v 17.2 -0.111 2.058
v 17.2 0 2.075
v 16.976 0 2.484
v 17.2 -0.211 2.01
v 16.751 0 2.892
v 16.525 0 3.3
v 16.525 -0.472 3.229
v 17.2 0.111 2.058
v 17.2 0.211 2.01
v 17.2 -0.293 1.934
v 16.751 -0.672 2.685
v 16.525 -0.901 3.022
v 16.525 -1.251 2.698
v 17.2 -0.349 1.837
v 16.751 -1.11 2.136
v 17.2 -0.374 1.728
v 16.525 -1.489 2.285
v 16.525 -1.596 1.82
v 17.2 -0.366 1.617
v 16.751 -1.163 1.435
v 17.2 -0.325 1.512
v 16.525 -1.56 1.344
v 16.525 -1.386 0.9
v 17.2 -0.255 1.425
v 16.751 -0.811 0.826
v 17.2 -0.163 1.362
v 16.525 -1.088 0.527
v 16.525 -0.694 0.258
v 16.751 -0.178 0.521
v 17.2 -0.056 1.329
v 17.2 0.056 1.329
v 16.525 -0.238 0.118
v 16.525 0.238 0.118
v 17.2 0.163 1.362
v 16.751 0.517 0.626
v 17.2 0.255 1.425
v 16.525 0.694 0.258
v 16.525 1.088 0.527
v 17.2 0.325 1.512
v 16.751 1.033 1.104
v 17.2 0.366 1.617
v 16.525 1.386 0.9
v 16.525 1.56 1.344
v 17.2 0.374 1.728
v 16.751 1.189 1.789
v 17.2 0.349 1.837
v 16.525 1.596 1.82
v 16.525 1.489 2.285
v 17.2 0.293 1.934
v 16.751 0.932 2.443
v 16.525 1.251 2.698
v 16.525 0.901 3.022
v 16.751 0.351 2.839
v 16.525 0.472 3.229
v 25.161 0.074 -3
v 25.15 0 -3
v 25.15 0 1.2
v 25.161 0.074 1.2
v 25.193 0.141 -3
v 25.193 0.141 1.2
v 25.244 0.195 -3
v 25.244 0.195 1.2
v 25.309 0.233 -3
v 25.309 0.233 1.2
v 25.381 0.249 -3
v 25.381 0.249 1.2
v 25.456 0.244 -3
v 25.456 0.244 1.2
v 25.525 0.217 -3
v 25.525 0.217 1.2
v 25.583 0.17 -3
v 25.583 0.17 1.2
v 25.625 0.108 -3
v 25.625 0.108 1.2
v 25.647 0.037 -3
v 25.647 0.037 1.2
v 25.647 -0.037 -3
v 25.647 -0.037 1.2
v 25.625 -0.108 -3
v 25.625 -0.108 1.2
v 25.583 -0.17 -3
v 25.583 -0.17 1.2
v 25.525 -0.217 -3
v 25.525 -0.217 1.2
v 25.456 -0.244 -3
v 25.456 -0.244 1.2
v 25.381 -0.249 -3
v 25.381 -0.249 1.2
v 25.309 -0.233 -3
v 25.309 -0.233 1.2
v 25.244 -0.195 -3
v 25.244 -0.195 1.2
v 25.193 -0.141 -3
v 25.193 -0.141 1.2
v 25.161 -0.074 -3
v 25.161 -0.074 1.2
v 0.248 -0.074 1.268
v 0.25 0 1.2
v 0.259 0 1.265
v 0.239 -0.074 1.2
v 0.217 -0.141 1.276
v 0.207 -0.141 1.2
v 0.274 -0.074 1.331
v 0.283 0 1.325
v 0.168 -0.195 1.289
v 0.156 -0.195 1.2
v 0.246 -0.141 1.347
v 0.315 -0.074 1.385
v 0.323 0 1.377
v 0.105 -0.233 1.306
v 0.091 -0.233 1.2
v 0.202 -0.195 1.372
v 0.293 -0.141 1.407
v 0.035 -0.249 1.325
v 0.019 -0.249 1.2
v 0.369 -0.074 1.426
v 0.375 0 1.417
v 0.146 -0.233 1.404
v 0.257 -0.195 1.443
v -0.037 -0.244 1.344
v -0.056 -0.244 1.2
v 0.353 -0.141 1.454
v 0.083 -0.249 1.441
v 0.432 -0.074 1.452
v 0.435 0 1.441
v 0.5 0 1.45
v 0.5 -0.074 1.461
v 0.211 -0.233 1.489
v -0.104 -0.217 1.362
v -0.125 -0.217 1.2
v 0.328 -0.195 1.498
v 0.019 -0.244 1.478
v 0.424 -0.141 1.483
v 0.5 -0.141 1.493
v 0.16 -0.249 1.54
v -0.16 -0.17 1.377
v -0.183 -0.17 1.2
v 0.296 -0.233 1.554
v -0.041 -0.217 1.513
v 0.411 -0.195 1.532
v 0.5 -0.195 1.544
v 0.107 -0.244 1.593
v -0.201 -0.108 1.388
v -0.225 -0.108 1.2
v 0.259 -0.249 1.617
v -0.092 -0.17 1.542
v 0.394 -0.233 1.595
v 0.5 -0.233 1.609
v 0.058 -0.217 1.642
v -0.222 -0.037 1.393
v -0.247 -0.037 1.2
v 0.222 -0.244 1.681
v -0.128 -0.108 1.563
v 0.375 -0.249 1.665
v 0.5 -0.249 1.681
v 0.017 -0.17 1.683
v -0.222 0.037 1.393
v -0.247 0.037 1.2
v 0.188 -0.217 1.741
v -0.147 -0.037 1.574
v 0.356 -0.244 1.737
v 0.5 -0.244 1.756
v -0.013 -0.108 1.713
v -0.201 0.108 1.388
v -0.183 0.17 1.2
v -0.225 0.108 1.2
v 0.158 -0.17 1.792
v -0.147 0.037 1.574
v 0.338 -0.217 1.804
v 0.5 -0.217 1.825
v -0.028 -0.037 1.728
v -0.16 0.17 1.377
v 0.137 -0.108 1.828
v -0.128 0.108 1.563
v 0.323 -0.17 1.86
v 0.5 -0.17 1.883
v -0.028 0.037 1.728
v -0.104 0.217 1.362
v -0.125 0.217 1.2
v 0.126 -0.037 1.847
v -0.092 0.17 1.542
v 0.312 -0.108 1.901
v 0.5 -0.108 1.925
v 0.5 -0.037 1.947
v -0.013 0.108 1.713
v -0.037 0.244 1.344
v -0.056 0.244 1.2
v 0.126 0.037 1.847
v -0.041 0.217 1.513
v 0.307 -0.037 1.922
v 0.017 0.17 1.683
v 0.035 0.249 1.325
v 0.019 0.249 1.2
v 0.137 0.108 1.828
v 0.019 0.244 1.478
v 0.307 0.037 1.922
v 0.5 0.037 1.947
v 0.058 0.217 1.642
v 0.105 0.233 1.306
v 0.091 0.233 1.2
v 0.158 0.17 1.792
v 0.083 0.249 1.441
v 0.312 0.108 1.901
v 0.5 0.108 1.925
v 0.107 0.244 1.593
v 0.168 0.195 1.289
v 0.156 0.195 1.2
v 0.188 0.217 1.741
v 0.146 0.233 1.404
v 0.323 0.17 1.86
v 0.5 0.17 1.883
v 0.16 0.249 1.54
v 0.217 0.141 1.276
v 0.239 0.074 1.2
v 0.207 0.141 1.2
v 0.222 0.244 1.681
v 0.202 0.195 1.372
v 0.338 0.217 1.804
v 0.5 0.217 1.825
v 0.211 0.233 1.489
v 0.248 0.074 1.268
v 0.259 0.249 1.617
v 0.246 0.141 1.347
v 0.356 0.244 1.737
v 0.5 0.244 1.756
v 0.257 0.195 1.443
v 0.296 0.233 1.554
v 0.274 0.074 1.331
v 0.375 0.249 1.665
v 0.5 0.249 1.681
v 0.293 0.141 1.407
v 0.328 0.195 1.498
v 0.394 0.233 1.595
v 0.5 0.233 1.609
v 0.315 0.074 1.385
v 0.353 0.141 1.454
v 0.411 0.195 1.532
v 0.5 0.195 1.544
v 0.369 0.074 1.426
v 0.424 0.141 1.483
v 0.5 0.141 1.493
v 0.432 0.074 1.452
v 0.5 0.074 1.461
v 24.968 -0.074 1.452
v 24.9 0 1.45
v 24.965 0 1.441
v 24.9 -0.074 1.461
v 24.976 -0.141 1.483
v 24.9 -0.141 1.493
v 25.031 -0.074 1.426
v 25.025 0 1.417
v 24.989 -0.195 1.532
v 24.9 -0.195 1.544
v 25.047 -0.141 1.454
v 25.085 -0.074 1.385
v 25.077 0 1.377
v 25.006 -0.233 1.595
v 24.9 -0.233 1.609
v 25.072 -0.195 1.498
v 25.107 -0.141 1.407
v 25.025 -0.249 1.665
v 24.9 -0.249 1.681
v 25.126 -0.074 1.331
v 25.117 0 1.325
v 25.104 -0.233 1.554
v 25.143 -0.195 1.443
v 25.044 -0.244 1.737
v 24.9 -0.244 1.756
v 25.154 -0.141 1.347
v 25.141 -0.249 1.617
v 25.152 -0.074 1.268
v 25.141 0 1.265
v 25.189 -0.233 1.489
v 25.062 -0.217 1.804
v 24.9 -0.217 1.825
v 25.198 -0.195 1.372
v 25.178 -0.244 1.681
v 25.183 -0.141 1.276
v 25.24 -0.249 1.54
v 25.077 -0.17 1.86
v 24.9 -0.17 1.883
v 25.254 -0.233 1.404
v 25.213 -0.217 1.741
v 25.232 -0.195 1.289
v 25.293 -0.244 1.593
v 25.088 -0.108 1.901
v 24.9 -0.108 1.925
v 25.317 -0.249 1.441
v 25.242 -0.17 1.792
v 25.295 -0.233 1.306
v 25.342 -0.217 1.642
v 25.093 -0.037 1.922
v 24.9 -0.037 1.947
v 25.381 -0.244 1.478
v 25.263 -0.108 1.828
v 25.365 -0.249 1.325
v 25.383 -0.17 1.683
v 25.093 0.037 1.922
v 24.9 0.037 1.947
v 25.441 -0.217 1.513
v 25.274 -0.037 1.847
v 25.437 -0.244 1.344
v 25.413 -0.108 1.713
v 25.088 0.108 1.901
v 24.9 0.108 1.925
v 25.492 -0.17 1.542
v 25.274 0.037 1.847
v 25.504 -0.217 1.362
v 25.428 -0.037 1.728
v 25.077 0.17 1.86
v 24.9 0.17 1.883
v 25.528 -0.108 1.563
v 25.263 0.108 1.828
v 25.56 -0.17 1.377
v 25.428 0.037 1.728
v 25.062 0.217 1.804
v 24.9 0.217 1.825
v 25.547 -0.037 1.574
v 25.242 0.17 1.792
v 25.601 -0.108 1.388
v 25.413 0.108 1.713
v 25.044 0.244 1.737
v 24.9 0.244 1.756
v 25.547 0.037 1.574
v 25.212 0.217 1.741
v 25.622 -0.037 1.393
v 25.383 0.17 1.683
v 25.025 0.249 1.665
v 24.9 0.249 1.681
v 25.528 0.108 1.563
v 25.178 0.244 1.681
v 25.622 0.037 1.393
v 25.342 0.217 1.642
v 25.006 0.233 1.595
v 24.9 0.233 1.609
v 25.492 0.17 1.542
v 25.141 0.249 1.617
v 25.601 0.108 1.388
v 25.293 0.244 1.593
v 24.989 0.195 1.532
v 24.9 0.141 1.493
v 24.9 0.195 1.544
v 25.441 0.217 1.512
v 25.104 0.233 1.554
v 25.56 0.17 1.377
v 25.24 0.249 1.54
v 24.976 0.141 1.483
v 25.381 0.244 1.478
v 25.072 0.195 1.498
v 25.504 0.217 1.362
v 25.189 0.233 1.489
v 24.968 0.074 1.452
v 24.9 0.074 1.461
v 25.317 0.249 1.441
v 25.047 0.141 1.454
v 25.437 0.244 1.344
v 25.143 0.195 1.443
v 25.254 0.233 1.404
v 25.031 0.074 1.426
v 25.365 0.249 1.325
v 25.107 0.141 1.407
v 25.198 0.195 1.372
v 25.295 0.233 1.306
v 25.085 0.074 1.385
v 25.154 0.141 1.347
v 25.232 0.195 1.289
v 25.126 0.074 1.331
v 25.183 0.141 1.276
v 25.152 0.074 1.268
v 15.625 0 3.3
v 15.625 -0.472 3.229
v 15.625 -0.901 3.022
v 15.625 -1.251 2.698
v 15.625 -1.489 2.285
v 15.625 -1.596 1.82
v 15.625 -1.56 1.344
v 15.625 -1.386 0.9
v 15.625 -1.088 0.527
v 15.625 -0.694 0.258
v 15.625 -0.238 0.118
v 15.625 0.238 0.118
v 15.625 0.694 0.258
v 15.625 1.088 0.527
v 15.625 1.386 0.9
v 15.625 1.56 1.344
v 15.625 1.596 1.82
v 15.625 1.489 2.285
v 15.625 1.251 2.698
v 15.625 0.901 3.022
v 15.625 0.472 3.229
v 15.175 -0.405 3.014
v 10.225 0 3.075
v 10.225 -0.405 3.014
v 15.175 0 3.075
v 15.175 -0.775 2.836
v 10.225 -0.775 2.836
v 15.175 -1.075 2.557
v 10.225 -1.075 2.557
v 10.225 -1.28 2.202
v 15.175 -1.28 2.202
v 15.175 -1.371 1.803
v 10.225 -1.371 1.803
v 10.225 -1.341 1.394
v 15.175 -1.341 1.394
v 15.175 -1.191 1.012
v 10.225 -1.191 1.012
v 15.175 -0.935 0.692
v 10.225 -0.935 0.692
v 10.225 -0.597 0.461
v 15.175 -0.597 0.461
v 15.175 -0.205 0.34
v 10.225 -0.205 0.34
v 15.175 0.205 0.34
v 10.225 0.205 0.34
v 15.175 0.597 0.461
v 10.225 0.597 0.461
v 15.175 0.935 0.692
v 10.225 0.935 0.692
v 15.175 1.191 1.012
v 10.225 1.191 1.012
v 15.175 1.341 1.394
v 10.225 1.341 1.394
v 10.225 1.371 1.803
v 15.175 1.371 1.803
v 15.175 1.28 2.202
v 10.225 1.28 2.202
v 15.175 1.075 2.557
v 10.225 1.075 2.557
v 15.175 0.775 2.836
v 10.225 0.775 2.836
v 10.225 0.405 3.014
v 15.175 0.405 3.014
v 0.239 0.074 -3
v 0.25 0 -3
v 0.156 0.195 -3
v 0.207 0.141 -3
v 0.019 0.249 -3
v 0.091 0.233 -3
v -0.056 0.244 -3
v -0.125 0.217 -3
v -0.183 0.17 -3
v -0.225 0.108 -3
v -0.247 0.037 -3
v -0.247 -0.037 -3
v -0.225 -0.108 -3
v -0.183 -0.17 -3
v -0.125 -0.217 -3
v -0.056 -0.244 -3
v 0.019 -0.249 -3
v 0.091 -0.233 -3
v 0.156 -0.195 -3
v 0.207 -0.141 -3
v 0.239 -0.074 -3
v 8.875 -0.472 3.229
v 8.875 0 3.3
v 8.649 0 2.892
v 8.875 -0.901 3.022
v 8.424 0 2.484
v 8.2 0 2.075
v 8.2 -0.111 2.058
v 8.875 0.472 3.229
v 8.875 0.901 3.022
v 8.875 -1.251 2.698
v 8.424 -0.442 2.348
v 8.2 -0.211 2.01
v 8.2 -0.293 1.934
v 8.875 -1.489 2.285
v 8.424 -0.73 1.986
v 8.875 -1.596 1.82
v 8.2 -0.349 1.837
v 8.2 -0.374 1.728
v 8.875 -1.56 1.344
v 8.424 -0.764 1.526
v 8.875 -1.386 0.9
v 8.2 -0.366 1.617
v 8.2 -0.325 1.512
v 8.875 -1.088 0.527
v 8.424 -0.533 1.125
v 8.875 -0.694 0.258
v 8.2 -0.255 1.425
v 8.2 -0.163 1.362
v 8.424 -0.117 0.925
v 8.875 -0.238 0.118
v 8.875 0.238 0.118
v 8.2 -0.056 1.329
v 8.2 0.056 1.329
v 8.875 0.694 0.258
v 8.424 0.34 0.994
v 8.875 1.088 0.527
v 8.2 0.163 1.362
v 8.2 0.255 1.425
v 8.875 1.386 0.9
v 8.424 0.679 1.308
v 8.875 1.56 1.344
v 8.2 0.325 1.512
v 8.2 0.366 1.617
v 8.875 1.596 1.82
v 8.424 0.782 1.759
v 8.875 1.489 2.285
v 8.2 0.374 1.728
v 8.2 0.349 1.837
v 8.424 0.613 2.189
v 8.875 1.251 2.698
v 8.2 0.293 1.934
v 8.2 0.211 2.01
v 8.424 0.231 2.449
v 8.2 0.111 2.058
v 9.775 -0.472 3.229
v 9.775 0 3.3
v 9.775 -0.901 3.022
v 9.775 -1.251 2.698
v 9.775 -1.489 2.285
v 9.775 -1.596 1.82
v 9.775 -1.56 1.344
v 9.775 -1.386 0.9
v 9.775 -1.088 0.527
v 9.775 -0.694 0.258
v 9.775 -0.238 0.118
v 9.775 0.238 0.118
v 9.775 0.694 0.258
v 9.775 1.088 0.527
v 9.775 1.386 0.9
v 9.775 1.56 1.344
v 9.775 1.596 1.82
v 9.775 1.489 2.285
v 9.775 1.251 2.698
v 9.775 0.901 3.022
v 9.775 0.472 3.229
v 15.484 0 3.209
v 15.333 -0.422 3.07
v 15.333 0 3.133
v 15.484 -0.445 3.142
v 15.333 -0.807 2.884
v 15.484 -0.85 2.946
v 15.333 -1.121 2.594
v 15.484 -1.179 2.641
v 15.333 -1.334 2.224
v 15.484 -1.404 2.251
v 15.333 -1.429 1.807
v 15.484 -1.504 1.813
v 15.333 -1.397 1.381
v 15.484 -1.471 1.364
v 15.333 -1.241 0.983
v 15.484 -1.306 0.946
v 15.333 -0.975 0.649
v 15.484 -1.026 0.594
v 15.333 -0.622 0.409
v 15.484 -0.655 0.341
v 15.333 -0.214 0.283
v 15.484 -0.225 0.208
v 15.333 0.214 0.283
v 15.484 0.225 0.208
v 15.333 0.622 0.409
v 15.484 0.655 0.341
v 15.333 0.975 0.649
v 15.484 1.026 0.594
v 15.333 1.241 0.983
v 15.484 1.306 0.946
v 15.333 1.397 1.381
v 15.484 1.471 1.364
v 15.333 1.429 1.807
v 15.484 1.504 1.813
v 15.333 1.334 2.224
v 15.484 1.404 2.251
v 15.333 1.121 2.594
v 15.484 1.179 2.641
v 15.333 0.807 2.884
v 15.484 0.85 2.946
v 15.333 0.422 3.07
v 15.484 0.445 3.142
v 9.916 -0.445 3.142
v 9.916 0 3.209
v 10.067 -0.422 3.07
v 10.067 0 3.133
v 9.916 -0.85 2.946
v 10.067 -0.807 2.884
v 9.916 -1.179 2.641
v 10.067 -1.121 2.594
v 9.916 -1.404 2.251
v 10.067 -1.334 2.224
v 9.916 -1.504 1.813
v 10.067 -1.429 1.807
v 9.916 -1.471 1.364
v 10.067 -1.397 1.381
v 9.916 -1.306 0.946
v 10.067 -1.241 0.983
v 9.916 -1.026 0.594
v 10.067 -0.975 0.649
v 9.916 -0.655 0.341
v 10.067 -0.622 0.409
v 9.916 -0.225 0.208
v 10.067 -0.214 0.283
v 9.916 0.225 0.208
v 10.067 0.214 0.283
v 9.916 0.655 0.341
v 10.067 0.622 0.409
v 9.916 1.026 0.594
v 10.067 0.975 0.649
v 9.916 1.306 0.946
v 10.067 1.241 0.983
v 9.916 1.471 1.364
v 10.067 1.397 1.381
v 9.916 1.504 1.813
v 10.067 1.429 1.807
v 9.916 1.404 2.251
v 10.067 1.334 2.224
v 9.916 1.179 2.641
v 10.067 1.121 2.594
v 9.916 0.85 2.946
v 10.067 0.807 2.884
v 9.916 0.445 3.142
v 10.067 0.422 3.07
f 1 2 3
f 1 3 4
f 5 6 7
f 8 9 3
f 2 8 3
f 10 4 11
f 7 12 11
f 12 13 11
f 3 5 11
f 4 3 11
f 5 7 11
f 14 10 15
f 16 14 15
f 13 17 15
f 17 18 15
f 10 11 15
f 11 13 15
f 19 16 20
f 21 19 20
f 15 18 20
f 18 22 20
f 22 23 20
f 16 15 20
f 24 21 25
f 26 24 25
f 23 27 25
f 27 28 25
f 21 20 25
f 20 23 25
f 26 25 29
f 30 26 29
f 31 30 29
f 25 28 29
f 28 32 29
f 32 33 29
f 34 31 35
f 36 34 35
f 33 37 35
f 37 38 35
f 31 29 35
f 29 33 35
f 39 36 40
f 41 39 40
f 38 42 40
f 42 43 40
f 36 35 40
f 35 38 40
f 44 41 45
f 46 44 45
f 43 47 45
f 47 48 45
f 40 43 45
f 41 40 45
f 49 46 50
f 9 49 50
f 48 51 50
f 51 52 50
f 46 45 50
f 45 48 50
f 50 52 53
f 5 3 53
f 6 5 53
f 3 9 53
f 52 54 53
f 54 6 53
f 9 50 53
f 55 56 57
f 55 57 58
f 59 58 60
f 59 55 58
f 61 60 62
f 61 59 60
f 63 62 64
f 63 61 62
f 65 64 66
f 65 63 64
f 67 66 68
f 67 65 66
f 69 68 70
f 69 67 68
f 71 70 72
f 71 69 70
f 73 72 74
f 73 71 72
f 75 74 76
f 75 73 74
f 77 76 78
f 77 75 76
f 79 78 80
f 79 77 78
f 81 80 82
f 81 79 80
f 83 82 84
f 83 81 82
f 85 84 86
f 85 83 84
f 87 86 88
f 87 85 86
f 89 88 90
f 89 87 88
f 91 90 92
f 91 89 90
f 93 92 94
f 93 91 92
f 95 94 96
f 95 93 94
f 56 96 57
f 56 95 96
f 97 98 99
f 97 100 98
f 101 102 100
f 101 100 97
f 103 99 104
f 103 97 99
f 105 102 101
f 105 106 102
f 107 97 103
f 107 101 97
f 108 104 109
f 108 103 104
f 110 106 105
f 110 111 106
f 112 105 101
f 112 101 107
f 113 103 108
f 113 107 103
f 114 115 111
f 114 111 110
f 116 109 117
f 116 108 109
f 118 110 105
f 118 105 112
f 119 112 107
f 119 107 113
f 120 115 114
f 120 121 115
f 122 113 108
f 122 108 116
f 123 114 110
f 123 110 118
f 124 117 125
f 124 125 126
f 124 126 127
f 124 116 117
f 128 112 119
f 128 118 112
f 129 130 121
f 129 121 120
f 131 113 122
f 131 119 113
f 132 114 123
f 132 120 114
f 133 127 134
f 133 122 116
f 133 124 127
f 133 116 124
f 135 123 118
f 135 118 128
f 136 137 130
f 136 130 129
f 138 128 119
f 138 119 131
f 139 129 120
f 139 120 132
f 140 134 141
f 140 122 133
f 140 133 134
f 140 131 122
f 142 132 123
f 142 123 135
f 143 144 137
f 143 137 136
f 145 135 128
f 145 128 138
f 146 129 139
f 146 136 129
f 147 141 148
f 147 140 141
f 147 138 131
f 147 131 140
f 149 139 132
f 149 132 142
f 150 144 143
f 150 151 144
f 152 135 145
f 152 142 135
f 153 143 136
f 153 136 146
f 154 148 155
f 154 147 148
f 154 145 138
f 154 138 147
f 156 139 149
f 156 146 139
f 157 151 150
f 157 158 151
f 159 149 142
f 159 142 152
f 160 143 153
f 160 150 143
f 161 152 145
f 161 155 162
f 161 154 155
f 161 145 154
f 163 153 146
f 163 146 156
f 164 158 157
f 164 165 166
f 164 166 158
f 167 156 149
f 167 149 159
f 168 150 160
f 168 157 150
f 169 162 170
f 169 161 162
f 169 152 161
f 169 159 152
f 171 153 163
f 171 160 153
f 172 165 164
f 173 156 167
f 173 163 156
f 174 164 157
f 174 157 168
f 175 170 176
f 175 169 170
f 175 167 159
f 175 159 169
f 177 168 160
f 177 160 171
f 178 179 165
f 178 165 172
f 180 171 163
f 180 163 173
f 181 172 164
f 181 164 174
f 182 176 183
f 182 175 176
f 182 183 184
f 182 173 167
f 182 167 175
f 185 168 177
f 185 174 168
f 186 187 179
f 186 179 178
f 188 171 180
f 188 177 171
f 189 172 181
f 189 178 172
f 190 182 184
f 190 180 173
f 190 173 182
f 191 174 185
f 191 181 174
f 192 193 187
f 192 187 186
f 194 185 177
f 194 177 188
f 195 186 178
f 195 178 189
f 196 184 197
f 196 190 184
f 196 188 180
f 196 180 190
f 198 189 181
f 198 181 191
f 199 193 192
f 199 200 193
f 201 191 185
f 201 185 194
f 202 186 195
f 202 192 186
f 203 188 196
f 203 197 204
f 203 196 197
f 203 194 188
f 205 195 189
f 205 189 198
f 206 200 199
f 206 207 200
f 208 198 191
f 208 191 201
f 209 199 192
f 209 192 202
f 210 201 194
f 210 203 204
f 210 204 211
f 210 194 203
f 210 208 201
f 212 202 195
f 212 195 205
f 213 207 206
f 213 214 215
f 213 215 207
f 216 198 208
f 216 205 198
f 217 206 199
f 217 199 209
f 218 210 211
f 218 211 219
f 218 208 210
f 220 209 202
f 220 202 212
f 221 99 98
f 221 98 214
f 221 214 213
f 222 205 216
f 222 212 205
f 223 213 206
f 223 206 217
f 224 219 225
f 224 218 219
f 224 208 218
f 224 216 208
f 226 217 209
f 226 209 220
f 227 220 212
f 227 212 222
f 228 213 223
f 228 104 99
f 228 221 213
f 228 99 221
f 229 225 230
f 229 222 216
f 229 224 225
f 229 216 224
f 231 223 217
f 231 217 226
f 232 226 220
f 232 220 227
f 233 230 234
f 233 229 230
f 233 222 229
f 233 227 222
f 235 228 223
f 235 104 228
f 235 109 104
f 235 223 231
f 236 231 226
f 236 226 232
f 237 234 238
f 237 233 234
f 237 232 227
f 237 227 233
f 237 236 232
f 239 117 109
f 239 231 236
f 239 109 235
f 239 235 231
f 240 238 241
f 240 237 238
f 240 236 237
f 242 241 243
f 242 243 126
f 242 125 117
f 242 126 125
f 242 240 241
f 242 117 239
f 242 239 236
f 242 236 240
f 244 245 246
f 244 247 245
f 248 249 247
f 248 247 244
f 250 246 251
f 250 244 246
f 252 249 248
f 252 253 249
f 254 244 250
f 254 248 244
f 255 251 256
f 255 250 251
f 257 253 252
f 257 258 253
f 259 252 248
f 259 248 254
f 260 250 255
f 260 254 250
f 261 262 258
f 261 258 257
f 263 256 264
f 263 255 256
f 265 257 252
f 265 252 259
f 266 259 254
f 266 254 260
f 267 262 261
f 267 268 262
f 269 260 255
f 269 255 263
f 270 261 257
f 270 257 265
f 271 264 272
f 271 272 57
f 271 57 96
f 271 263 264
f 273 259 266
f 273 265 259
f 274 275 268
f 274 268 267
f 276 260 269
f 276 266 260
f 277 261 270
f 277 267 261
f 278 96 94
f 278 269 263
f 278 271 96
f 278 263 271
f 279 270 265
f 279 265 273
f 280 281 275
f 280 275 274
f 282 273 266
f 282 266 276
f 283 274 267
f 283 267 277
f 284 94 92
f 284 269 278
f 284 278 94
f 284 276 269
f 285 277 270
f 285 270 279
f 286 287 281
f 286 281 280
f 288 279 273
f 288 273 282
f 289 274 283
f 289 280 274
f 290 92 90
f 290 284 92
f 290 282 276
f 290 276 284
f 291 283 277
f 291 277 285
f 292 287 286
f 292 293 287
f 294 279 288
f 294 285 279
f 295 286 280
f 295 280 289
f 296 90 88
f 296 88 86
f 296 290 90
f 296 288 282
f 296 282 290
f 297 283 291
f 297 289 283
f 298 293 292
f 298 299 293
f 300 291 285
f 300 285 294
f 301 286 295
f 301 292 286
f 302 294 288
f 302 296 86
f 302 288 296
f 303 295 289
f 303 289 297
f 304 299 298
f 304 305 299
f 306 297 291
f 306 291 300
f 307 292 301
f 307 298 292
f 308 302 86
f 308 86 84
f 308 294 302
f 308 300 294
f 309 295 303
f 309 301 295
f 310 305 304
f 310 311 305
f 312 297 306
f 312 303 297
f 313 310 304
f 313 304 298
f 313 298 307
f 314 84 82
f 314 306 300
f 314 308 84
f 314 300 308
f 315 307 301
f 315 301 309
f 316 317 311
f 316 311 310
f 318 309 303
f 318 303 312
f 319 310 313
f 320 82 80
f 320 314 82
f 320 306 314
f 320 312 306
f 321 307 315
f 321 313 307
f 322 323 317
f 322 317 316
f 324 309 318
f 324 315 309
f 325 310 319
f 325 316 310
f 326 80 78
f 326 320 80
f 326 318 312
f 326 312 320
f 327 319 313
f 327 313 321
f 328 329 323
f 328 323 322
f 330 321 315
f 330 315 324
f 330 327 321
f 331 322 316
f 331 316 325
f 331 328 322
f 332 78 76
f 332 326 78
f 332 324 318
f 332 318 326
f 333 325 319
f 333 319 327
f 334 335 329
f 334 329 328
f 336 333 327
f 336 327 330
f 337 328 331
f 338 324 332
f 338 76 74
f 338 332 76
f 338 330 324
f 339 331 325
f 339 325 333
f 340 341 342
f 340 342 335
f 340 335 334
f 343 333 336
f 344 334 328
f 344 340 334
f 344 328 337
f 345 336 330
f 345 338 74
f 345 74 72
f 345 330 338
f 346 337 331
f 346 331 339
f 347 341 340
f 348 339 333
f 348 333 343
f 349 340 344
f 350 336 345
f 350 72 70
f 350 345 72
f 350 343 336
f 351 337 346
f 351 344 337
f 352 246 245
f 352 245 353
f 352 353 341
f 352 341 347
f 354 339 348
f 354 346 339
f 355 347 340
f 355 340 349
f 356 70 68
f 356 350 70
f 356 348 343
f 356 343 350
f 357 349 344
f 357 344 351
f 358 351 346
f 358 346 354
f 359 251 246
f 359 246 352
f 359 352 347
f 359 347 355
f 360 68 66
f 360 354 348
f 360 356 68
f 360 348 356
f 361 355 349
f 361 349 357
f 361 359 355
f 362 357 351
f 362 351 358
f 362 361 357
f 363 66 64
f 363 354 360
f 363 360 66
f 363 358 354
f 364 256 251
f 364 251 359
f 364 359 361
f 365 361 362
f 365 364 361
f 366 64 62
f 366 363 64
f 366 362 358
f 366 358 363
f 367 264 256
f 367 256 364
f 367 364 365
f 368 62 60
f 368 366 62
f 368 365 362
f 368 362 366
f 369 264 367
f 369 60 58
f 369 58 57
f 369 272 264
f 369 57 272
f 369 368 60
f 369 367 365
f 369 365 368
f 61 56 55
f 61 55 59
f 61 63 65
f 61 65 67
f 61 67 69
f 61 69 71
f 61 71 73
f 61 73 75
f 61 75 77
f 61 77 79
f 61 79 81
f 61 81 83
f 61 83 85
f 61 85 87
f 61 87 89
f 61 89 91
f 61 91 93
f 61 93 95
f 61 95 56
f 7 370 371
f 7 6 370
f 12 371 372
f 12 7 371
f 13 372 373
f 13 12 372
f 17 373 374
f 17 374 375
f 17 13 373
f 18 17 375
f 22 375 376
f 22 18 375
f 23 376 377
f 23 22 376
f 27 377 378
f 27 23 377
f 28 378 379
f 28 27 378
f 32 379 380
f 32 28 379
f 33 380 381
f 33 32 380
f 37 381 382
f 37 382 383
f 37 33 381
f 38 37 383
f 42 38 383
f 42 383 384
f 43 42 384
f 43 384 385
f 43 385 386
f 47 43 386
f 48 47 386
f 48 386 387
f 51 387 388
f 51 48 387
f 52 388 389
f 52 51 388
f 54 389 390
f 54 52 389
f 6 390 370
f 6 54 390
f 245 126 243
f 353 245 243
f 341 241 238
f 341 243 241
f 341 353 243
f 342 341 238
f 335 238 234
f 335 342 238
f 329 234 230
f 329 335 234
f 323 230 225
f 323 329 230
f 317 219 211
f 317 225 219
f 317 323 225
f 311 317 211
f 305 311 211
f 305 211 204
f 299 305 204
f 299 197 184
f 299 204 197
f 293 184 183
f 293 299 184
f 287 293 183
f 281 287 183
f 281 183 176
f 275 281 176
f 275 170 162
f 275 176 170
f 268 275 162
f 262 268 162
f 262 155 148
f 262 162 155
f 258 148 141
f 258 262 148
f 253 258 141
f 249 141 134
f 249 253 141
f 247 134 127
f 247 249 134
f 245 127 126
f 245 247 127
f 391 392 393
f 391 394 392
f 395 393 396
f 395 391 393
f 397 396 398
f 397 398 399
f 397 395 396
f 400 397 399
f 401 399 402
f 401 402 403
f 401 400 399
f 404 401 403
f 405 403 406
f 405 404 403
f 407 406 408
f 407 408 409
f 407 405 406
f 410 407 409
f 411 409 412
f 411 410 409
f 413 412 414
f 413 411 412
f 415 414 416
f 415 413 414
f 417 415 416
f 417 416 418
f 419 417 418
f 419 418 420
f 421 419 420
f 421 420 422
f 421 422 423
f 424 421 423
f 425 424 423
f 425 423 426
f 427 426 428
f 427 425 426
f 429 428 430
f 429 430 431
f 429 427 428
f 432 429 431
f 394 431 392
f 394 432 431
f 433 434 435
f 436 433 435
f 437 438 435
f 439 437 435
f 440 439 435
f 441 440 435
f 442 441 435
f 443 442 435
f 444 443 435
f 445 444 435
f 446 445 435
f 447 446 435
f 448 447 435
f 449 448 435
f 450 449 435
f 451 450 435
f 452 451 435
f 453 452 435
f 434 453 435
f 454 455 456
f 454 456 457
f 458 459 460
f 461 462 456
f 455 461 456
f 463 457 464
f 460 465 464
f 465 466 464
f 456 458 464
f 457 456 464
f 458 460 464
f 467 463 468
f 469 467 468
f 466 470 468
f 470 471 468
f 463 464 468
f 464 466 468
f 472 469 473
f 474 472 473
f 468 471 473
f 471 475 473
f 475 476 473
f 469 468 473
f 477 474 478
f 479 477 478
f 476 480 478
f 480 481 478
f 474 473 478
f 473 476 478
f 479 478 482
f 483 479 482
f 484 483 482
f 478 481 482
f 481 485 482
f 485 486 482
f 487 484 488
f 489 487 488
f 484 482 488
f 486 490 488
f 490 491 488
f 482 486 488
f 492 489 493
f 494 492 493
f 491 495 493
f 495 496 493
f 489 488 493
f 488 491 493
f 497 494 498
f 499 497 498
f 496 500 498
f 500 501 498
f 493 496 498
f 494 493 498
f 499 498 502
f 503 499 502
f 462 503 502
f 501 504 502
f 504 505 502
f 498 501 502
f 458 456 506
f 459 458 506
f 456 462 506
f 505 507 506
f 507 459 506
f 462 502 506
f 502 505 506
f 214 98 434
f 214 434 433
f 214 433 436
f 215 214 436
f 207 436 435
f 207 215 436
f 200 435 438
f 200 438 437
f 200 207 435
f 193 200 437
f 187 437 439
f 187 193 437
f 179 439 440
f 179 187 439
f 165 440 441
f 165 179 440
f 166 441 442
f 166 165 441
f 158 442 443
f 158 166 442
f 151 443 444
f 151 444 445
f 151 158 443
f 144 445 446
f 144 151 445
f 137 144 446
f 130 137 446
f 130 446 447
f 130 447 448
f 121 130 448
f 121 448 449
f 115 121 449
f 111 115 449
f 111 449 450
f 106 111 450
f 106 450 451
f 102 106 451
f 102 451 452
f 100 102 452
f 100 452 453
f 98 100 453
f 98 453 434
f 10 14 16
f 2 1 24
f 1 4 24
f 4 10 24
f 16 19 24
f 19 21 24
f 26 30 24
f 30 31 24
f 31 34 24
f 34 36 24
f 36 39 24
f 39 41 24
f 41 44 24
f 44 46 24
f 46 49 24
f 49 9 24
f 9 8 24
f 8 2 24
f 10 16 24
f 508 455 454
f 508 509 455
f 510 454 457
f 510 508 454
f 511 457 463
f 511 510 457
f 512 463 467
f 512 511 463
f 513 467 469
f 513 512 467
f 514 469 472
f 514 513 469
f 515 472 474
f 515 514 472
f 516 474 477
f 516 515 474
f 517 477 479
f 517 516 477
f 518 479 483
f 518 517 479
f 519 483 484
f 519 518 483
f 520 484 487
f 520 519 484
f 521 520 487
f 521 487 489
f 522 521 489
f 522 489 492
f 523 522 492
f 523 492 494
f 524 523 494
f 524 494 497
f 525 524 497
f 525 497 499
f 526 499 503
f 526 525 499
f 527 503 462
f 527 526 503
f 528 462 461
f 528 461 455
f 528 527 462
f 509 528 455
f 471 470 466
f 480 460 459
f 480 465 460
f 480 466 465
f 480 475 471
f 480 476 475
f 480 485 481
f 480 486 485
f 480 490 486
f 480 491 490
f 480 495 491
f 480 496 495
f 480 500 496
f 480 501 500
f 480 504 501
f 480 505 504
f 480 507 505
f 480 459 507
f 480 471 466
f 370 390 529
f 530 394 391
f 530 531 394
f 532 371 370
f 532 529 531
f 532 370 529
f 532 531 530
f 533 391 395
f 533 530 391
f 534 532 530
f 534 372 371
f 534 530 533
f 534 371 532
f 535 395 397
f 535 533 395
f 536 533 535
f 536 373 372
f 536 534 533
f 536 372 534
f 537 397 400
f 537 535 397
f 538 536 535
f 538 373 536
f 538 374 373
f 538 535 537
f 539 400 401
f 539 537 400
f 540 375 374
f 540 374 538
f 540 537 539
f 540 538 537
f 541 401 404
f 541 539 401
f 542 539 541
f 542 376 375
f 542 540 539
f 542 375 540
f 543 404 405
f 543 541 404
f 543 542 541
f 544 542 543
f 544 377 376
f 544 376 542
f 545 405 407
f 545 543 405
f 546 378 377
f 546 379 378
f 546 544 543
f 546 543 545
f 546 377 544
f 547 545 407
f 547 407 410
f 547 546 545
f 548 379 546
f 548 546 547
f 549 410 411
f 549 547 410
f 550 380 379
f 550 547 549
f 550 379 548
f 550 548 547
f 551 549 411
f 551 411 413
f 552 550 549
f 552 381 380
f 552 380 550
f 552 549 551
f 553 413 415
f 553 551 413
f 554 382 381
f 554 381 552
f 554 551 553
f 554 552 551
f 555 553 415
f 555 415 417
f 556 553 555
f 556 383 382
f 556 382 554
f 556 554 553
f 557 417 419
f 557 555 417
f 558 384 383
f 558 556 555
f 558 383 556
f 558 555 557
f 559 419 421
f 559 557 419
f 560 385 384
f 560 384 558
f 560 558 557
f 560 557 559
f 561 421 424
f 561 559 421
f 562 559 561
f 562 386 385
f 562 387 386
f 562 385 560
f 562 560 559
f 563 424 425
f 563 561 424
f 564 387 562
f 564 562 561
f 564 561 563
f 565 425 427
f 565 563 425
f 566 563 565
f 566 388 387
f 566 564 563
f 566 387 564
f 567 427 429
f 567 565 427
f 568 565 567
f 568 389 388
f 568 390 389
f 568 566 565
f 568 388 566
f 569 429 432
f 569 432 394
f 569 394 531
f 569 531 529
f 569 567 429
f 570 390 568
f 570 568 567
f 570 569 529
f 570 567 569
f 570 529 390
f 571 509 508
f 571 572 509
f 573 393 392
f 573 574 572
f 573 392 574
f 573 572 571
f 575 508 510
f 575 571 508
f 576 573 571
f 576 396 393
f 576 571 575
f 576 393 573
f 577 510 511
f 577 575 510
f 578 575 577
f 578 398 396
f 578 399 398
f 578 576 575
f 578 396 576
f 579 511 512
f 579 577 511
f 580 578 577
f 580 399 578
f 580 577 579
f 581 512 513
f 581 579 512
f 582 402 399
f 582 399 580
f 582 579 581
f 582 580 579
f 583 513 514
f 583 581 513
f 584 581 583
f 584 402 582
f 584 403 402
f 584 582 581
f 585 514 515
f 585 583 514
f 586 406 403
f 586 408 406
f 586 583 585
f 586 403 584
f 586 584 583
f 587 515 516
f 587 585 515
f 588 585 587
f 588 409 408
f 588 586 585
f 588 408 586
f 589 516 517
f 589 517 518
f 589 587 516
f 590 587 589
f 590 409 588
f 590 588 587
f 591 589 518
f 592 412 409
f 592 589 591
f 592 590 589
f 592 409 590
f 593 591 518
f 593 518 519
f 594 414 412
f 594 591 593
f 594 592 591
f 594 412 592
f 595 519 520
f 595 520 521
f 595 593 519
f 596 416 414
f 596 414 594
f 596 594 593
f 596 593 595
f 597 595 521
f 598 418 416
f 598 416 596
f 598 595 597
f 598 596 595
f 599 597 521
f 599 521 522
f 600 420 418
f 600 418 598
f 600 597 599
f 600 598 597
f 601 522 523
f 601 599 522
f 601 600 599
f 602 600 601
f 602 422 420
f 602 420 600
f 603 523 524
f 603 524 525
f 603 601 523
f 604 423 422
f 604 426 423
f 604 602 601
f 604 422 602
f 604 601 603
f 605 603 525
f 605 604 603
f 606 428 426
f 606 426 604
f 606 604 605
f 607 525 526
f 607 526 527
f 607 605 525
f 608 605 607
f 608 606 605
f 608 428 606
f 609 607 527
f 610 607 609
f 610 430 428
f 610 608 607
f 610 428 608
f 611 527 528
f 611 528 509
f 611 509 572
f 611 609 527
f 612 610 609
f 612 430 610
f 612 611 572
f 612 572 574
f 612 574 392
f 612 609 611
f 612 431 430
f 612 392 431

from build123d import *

# Parameters (mm, degrees)
SKETCH_R = 0.25


with BuildPart() as revolution:
    # Sketch002 → Revolution (revolve)
    with BuildSketch(Plane.XZ):
        with BuildLine():
            Line((8.875, 3.3), (9.775, 3.3))
            ThreePointArc((9.775, 3.3), (9.990689, 3.168878), (10.225, 3.075))
            Line((10.225, 3.075), (15.175, 3.075))
            ThreePointArc((15.175, 3.075), (15.409311, 3.168878), (15.625, 3.3))
            Line((15.625, 3.3), (16.525, 3.3))
            ThreePointArc((17.2, 2.075), (16.863989, 2.68832), (16.525, 3.3))
            Line((17.2, 1.7), (17.2, 2.075))
            Line((8.2, 1.7), (17.2, 1.7))
            Line((8.2, 1.7), (8.2, 2.075))
            ThreePointArc((8.875, 3.3), (8.536011, 2.68832), (8.2, 2.075))
        make_face()
    revolve(axis=Axis((8.2, 0, 1.7), (1, 0, 0)))


with BuildPart() as sweep_body:
    # Sweep: sweep along a path in Sketch001
    with BuildLine(Plane.XZ) as sweep_path:
        Line((0, -3), (0, 1.2))
        ThreePointArc((0, 1.2), (0.14645, 1.553557), (0.50001, 1.7))
        Line((0.50001, 1.7), (24.9, 1.7))
        ThreePointArc((24.9, 1.7), (25.253553, 1.553553), (25.4, 1.2))
        Line((25.4, 1.2), (25.4, -3))
    # Sketch → Sweep (sweep)
    with BuildSketch(Plane.XY.offset(-2)):
        Circle(SKETCH_R)
    sweep(path=sweep_path.line)


solid = Compound([revolution.part, sweep_body.part])
